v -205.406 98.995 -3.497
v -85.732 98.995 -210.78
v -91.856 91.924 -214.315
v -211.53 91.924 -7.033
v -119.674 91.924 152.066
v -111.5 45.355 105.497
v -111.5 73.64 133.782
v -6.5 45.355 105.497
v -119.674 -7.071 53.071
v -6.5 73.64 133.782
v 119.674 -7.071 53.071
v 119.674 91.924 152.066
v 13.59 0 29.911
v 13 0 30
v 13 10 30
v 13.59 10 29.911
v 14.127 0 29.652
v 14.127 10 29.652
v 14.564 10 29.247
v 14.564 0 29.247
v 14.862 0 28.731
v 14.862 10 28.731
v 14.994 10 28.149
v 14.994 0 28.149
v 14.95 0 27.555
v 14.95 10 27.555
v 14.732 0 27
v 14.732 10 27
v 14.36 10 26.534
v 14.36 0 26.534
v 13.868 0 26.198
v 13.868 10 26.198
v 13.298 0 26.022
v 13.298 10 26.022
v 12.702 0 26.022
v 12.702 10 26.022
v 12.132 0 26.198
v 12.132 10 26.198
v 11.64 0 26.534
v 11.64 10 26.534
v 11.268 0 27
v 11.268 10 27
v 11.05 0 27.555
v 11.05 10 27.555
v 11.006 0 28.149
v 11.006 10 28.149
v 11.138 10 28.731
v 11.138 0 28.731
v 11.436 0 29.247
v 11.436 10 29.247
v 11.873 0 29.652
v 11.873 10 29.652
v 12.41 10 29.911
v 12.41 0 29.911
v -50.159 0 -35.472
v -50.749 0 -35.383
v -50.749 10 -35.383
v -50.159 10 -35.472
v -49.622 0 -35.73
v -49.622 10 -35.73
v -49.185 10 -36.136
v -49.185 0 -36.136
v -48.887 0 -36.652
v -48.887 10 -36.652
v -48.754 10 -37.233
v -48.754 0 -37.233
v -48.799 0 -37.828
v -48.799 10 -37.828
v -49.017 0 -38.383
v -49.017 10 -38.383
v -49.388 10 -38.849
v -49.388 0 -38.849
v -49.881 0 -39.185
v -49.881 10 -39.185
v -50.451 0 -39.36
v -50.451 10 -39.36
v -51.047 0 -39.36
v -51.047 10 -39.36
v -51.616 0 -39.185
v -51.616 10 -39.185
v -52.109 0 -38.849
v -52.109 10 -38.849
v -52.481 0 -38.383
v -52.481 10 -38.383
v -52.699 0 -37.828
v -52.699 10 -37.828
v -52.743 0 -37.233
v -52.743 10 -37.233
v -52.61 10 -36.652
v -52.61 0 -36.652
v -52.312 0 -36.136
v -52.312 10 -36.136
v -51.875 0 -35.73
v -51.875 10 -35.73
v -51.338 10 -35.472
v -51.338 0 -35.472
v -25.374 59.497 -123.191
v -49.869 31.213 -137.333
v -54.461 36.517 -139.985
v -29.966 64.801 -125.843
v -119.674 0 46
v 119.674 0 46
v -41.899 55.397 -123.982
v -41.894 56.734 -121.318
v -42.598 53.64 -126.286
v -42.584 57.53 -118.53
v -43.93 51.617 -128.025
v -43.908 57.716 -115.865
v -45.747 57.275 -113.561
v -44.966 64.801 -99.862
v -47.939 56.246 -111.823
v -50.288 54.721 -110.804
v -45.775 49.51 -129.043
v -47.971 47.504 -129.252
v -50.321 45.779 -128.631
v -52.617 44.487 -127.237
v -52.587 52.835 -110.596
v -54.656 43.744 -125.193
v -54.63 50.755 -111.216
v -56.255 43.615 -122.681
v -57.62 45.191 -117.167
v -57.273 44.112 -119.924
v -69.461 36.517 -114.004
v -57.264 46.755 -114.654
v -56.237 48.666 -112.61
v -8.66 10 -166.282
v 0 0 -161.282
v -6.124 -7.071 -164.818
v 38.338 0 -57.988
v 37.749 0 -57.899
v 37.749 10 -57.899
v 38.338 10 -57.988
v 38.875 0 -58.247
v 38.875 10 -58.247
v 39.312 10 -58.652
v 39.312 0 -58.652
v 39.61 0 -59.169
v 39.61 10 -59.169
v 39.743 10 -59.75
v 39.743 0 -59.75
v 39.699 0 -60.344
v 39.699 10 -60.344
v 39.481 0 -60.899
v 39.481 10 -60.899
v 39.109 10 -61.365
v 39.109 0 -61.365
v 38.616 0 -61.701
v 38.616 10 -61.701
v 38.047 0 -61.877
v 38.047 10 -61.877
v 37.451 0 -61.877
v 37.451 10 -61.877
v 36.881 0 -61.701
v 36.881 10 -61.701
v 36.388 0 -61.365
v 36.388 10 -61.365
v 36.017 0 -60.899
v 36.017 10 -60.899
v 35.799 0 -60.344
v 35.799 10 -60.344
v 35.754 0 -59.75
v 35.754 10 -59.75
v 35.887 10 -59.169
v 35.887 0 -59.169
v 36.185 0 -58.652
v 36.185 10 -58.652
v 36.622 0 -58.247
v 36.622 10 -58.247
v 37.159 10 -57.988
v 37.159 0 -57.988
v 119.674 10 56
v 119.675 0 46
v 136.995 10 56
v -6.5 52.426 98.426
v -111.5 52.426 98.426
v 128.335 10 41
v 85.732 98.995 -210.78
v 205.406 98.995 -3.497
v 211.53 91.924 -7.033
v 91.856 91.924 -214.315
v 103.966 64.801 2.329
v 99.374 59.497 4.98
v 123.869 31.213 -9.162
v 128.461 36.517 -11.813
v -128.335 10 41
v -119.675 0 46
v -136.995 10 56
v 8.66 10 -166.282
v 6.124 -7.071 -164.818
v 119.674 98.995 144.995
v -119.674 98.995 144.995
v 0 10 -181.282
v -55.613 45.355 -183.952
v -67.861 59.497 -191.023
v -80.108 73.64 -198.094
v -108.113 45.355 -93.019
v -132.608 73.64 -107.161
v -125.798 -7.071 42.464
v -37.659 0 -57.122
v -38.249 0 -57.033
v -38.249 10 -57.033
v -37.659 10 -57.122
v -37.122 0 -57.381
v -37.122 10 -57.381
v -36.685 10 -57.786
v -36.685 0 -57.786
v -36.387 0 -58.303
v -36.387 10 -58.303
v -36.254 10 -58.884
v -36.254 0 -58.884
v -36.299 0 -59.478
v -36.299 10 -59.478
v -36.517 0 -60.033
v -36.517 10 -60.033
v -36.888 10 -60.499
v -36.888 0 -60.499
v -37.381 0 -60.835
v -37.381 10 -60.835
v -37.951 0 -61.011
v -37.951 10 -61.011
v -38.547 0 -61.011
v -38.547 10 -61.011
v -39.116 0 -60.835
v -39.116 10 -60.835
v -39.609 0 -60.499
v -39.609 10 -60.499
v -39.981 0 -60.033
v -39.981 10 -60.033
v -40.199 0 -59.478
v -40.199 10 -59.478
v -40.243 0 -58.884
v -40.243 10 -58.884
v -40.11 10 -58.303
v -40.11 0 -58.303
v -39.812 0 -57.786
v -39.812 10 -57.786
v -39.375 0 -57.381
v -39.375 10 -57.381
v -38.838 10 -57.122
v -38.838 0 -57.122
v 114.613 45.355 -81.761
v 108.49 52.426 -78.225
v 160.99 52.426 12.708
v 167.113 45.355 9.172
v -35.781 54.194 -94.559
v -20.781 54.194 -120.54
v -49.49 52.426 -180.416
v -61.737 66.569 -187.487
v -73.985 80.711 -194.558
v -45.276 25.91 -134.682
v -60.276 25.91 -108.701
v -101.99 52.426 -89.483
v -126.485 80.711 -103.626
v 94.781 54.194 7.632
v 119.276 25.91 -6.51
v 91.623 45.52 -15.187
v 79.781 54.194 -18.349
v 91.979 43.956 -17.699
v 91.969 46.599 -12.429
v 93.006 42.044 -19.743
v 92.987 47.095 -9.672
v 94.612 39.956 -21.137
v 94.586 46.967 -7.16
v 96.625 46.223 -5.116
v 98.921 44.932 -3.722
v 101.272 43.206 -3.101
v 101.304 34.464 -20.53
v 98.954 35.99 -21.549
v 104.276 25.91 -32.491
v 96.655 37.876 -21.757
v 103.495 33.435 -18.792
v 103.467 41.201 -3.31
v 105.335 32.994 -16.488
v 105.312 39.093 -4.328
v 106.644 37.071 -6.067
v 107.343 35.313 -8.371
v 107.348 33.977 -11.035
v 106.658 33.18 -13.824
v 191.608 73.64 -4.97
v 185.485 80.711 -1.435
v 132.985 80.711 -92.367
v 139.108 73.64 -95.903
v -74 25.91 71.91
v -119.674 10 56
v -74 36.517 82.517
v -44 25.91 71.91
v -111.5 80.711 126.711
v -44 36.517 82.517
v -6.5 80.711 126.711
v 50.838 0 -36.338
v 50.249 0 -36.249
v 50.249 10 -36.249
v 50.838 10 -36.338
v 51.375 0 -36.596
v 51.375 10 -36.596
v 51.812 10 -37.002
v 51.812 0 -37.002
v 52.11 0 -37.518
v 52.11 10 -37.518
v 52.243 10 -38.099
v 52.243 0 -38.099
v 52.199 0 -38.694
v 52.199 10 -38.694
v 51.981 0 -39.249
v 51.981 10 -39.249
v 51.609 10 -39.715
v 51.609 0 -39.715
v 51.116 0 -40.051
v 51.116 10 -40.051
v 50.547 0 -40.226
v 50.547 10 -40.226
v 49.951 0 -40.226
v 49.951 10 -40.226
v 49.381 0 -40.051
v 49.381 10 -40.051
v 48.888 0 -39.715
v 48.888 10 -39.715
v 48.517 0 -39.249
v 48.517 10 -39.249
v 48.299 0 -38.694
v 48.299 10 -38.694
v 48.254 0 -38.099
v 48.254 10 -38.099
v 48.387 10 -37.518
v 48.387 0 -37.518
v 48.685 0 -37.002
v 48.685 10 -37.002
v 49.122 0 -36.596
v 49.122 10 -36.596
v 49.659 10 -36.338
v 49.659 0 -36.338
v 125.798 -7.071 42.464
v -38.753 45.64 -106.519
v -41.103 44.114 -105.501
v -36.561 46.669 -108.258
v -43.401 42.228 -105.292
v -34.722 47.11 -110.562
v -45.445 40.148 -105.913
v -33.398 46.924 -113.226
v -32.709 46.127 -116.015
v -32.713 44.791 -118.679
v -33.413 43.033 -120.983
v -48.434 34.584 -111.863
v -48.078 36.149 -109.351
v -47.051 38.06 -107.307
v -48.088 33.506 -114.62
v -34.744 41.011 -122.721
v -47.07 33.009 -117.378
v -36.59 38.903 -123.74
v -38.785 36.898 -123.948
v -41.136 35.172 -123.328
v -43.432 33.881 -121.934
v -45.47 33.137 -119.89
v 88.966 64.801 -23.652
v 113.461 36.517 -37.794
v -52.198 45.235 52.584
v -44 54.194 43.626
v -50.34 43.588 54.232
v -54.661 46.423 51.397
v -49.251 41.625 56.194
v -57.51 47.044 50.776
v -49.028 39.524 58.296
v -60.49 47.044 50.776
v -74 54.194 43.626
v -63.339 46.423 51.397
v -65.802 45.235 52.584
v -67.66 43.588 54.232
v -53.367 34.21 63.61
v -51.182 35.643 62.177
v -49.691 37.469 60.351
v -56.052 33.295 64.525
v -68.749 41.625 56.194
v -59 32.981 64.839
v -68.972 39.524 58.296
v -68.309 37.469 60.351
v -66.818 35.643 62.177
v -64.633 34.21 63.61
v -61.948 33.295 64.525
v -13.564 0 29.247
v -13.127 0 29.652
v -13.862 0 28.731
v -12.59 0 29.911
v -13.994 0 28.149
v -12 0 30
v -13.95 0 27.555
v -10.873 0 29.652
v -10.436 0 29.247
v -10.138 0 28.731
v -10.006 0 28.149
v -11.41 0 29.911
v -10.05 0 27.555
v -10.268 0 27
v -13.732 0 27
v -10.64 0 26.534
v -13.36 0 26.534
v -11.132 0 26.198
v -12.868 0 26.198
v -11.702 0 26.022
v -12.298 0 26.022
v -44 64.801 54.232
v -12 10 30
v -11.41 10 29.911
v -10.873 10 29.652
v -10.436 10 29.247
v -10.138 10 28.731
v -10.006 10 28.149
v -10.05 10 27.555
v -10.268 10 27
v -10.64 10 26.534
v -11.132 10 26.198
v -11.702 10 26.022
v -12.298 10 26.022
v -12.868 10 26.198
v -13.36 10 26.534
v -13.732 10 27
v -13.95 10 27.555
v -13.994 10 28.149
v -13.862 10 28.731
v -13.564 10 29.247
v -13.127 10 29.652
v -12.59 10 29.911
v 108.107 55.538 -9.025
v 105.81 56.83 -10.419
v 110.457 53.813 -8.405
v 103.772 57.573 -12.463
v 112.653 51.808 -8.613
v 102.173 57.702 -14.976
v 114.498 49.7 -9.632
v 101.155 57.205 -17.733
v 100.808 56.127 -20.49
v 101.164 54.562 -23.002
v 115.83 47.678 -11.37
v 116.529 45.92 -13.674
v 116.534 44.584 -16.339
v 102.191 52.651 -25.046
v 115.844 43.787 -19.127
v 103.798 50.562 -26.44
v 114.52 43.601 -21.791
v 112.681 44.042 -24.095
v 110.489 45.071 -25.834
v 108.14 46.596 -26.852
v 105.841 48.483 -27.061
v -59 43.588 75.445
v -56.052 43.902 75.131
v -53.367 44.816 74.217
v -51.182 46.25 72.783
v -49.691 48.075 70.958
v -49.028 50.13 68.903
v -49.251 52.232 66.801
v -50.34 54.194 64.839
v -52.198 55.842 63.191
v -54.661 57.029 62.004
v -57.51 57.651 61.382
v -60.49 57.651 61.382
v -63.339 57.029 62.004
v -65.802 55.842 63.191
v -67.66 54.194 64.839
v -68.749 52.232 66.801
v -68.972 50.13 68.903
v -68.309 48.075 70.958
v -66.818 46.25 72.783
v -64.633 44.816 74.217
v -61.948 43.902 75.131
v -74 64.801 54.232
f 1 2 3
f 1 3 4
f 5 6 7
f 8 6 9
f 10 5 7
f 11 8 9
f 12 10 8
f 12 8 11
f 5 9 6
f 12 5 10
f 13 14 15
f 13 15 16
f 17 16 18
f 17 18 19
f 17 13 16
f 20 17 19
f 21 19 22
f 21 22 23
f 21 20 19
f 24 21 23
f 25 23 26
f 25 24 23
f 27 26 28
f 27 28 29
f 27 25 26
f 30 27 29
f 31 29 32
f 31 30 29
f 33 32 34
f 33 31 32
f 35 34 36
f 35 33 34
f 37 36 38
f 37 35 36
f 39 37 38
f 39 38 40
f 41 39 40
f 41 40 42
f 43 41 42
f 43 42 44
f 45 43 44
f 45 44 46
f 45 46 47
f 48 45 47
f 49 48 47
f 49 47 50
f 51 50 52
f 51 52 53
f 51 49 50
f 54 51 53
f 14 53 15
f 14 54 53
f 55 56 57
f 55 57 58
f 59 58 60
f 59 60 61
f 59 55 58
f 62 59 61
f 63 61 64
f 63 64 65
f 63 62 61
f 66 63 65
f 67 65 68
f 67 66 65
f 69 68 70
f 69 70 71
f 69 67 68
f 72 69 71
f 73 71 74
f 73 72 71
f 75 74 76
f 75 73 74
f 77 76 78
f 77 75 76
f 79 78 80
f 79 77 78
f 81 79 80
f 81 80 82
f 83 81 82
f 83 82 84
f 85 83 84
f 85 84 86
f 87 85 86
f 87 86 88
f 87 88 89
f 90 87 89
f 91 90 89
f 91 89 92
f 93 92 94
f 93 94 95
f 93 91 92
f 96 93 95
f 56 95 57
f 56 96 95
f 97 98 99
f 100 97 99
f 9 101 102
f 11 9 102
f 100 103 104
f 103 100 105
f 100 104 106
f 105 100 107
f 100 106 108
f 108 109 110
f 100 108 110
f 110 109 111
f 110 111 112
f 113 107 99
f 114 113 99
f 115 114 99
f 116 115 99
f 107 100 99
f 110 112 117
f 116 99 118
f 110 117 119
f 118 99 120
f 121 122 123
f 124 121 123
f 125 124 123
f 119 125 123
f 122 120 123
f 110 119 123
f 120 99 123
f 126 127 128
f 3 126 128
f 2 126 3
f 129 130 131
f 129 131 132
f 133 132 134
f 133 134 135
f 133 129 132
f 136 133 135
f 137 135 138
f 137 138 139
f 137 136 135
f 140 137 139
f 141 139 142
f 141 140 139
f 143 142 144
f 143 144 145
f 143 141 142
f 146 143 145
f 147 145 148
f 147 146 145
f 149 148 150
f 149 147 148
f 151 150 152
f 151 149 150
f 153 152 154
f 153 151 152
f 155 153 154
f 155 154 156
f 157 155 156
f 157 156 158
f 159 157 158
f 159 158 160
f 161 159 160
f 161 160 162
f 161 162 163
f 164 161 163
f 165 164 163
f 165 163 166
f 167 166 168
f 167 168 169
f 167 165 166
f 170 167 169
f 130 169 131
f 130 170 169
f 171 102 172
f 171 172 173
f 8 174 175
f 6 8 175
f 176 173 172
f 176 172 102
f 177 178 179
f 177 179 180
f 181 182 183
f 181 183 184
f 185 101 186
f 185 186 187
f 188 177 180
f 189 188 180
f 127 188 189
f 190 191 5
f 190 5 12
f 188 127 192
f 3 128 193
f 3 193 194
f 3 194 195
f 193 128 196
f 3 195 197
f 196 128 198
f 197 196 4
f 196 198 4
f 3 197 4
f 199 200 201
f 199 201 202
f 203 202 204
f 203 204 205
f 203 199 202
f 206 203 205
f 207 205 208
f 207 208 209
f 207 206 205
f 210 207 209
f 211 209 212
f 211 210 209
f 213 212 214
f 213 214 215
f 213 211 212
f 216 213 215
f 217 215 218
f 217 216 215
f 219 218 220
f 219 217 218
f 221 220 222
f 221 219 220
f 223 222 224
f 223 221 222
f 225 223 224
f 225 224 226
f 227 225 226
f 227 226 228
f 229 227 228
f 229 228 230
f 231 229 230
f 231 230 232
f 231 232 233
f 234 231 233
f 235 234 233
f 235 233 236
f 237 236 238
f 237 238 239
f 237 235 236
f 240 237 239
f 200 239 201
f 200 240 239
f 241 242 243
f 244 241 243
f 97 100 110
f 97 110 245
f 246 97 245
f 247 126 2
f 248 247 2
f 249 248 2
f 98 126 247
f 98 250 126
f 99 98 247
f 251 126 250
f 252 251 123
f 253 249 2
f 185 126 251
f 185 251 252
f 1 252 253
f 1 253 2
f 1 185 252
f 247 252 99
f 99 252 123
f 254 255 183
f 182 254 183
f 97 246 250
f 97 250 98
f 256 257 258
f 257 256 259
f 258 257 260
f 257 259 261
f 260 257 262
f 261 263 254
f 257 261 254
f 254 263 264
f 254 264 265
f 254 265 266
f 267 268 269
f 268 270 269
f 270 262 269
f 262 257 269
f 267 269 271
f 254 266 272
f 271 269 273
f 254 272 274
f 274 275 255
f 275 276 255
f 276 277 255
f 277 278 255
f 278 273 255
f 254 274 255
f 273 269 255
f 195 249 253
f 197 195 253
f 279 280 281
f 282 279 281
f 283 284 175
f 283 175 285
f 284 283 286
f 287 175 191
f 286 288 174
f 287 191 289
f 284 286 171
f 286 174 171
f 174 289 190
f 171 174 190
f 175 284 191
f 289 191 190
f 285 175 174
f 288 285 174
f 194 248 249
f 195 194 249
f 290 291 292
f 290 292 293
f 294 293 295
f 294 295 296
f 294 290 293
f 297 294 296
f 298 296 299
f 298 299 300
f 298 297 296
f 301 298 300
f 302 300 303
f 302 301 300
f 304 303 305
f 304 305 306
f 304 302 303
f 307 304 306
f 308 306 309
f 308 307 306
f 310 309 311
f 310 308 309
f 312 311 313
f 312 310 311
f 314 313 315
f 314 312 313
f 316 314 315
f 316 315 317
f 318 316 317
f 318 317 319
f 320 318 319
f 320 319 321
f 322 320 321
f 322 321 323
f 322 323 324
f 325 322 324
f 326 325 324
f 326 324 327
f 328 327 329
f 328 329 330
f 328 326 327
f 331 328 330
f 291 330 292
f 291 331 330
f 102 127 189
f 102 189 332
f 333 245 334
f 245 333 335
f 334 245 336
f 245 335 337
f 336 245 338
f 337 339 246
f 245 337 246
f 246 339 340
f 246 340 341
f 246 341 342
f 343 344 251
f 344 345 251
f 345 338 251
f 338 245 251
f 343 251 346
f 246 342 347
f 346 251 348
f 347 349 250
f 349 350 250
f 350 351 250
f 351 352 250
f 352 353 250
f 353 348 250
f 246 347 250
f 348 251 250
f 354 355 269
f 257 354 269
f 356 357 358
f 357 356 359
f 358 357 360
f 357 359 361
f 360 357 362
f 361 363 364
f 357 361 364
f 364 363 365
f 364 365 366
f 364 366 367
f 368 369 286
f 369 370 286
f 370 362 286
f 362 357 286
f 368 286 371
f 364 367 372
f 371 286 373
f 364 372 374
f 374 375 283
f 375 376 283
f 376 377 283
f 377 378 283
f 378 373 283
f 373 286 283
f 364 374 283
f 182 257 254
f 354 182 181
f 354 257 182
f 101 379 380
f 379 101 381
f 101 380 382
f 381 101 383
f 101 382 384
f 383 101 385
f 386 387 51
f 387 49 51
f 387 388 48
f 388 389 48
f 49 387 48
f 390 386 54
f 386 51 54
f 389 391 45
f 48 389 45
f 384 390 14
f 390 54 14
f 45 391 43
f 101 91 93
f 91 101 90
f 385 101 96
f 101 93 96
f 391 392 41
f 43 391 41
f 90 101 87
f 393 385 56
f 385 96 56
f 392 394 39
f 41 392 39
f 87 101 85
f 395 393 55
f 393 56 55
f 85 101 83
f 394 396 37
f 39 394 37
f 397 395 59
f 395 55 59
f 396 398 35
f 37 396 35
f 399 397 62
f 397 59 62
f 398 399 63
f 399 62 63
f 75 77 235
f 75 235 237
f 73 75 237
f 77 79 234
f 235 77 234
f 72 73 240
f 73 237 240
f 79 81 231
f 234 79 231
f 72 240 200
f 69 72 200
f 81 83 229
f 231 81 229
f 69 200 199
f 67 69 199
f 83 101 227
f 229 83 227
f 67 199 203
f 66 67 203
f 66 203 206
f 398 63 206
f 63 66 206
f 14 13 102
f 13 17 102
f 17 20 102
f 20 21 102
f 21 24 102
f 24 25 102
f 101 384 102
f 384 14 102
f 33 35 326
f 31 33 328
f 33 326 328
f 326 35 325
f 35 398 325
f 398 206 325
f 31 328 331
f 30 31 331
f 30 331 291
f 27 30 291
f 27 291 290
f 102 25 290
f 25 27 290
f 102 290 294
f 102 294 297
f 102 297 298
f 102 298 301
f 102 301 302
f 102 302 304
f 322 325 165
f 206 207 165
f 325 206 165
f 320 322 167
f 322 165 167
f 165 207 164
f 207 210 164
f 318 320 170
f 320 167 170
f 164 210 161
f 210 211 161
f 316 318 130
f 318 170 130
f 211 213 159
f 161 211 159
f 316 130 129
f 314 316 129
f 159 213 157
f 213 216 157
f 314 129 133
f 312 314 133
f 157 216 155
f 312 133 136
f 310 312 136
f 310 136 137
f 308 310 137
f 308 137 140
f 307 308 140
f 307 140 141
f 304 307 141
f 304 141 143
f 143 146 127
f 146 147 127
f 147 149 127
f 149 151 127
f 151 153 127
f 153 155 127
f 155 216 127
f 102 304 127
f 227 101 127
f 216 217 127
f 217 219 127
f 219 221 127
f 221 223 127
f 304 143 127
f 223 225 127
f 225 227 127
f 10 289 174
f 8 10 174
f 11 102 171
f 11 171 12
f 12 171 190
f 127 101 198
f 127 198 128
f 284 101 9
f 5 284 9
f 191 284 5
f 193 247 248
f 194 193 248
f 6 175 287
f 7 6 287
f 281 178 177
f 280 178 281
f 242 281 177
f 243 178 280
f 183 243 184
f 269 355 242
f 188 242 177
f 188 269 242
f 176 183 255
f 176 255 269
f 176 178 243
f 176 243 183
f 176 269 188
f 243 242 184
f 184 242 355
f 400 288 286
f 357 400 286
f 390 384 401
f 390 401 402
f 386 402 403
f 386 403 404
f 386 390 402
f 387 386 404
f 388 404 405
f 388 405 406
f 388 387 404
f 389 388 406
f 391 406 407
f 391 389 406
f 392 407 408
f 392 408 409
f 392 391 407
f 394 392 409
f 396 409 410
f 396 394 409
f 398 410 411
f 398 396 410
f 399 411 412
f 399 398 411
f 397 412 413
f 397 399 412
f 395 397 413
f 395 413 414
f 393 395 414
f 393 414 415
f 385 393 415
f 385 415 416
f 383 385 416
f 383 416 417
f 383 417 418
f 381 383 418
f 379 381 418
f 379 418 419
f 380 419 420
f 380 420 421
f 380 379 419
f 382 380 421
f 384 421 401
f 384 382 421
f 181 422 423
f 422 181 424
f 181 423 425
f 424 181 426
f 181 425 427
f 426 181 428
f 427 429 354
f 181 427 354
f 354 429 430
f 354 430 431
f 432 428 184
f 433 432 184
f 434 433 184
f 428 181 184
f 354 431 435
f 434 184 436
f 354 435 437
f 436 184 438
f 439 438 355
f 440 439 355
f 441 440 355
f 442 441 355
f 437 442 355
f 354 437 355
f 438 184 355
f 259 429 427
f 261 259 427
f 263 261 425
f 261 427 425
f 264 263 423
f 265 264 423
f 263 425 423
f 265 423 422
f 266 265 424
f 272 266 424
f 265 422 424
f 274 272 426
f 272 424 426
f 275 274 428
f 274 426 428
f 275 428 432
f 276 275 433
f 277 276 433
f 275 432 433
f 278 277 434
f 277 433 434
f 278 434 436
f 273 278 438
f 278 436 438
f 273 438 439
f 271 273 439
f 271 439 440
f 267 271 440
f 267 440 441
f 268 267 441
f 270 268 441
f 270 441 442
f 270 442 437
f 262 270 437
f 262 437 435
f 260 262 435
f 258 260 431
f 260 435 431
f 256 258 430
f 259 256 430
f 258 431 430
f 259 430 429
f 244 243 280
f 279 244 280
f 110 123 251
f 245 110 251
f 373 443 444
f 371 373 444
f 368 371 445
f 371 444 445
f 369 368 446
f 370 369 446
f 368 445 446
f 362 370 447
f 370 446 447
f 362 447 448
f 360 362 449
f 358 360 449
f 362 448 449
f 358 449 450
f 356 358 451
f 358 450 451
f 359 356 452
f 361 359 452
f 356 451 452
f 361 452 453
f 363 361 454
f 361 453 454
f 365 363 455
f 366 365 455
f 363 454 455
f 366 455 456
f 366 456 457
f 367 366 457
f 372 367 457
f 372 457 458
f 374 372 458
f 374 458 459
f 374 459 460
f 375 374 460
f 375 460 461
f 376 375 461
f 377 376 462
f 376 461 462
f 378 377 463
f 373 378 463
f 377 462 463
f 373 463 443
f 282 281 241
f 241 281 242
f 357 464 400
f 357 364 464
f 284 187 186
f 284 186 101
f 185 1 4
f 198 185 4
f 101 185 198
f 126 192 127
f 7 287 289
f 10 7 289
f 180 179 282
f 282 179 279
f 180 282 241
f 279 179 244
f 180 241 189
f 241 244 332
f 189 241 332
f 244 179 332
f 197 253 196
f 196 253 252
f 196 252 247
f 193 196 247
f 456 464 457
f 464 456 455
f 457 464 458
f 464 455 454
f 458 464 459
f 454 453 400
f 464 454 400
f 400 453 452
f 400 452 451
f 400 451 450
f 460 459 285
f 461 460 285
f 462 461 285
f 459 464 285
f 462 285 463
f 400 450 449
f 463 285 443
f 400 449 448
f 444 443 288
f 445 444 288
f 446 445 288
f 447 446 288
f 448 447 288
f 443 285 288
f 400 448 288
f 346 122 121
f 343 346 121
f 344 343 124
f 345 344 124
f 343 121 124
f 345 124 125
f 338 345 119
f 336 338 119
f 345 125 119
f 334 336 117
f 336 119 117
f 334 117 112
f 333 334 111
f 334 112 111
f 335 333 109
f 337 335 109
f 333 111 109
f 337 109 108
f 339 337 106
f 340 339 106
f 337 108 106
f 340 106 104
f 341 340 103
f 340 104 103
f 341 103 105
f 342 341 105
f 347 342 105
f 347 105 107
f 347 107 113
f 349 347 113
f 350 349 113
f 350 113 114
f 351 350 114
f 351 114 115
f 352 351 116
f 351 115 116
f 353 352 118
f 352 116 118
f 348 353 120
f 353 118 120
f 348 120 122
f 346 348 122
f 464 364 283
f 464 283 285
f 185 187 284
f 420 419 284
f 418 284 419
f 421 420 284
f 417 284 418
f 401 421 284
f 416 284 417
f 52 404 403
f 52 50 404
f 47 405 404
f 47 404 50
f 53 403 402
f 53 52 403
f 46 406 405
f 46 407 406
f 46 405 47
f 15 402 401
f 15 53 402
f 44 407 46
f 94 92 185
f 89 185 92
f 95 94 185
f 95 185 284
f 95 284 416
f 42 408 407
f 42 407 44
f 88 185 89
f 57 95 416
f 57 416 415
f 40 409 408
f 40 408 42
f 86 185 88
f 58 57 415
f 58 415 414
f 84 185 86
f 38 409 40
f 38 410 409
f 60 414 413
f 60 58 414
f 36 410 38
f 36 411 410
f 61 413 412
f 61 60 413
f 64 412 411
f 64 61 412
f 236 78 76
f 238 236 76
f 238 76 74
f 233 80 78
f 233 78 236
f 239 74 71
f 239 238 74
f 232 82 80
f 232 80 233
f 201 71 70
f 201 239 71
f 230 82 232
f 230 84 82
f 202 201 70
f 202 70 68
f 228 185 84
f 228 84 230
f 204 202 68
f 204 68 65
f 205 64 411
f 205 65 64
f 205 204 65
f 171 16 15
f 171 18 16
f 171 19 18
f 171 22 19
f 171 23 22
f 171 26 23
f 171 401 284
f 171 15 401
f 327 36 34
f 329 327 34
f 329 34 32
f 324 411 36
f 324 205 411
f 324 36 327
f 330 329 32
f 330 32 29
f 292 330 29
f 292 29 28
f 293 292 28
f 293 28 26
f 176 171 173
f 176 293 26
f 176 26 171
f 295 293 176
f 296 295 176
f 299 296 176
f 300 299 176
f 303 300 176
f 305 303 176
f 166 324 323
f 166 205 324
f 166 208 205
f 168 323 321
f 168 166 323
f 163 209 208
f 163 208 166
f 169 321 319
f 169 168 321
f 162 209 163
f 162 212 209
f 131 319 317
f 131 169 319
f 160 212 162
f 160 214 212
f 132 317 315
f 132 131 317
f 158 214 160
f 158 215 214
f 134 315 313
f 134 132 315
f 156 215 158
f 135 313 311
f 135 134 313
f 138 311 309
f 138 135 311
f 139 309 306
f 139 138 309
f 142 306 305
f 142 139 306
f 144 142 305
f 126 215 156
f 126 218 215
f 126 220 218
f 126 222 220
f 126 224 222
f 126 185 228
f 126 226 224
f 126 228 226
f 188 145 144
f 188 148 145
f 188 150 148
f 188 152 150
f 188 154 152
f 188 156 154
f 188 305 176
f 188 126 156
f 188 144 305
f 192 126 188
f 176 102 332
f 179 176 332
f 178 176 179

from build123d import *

# Parameters (mm, degrees)
SKETCH1_R           = 2
BOSS_EXTRUDE1_DEPTH = 10
CHAMFER2_SIZE       = 10
BOSS_EXTRUDE2_DEPTH = 10
BOSS_EXTRUDE3_DEPTH = 10
SKETCH6_W           = 239.348674296
SKETCH6_H           = 140
BOSS_EXTRUDE4_DEPTH = 10
CUT_EXTRUDE1_DEPTH  = 10
CUT_EXTRUDE2_DEPTH  = 10
CUT_EXTRUDE3_DEPTH  = 10
BOSS_EXTRUDE5_DEPTH = 40
SKETCH13_R          = 10
CUT_EXTRUDE4_DEPTH  = 15
BOSS_EXTRUDE6_DEPTH = 40
SKETCH15_R          = 10
CUT_EXTRUDE5_DEPTH  = 15
BOSS_EXTRUDE7_DEPTH = 40
SKETCH17_R          = 10
CUT_EXTRUDE6_DEPTH  = 15


with BuildPart() as part:
    # Sketch1 → Boss-Extrude1 (new body)
    with BuildSketch(Plane(origin=(0, 0, 0), x_dir=(1, 0, 0), z_dir=(0, 1, 0))):
        Polygon((0, 181.282032303), (-136.994845224, -56), (136.994845224, -56), align=None)
        with Locations(Location((-38.248711306, 59.033320997, 0), (0, 0, 270))):
            Circle(SKETCH1_R, mode=Mode.SUBTRACT)
        with Locations(Location((-50.748711306, 37.382685902, 0), (0, 0, 270))):
            Circle(SKETCH1_R, mode=Mode.SUBTRACT)
        with Locations(Location((37.748711306, 59.899346401, 0), (0, 0, 270))):
            Circle(SKETCH1_R, mode=Mode.SUBTRACT)
        with Locations(Location((50.248711306, 38.248711306, 0), (0, 0, 270))):
            Circle(SKETCH1_R, mode=Mode.SUBTRACT)
        with Locations(Location((-12, -28, 0), (0, 0, 270))):
            Circle(SKETCH1_R, mode=Mode.SUBTRACT)
        with Locations(Location((13, -28, 0), (0, 0, 270))):
            Circle(SKETCH1_R, mode=Mode.SUBTRACT)
    extrude(amount=BOSS_EXTRUDE1_DEPTH)

    # Chamfer2
    chamfer2_edges = [part.edges().sort_by_distance(p)[0] for p in [
        (68.497422612, 0, -62.641016151),
        (-68.497422612, 0, -62.641016151),
        (0, 0, 56),
    ]]
    chamfer(chamfer2_edges, length=CHAMFER2_SIZE - 0.0001)  # a hair under: the kernel refuses the full size

    # Sketch4 → Boss-Extrude2 (add)
    with BuildSketch(Plane(origin=(34.918584287, -40.320508076, -20.160254038), x_dir=(0.7905694150420945, 0.547722557505166, 0.2738612787525844), z_dir=(0.6123724356957949, -0.7071067811865465, -0.3535533905932751))):
        Polygon((107.208489537, 41.143650786), (215.652023231, -47.400123699), (64.274630088, -232.798809596), (-44.168903606, -144.255035111), align=None)
    extrude(amount=BOSS_EXTRUDE2_DEPTH)

    # Sketch5 → Boss-Extrude3 (add)
    with BuildSketch(Plane(origin=(-34.918584287, -40.320508076, -20.160254038), x_dir=(0.7905694150420941, -0.5477225575051675, -0.27386127875258237), z_dir=(-0.6123724356957955, -0.7071067811865476, -0.35355339059327195))):
        Polygon((44.168903606, -144.255035111), (-64.274630088, -232.798809596), (-215.652023231, -47.400123699), (-107.208489537, 41.143650786), align=None)
    extrude(amount=BOSS_EXTRUDE3_DEPTH)

    # Sketch6 → Boss-Extrude4 (add)
    with BuildSketch(Plane(origin=(0, -23, 23), x_dir=(1, 0, 0), z_dir=(0, -0.7071067811865468, 0.7071067811865483))):
        with Locations((0, 102.526911935)):
            Rectangle(SKETCH6_W, SKETCH6_H)
    extrude(amount=BOSS_EXTRUDE4_DEPTH)

    # Sketch8 → Cut-Extrude1 (cut)
    with BuildSketch(Plane(origin=(-34.918584287, -40.320508076, -20.160254038), x_dir=(0.7905694150420941, -0.5477225575051675, -0.2738612787525823), z_dir=(0.6123724356957955, 0.7071067811865477, 0.35355339059327195))):
        Polygon((-33.923185833, 197.463935256), (-49.415119218, 210.113045896), (-115.822950082, 128.780395626), (-84.839083312, 103.482174345), (-18.431252448, 184.814824615), align=None)
    extrude(amount=-CUT_EXTRUDE1_DEPTH, mode=Mode.SUBTRACT)

    # Sketch10 → Cut-Extrude2 (cut)
    with BuildSketch(Plane(origin=(34.918584287, -40.320508076, -20.160254038), x_dir=(0.7905694150420944, 0.5477225575051661, 0.2738612787525847), z_dir=(-0.6123724356957952, 0.7071067811865464, 0.3535533905932753))):
        Polygon((174.960769477, 24.728878015), (190.452702862, 37.377988656), (124.044871998, 118.710638926), (93.061005228, 93.412417645), (159.468836092, 12.079767374), align=None)
    extrude(amount=-CUT_EXTRUDE2_DEPTH, mode=Mode.SUBTRACT)

    # Sketch11 → Cut-Extrude3 (cut)
    with BuildSketch(Plane(origin=(0, -23, 23), x_dir=(1, 0, 0), z_dir=(0, 0.7071067811865468, -0.7071067811865483))):
        Polygon((-111.5, -126.669047558), (-111.5, -146.669047558), (-6.5, -146.669047558), (-6.5, -106.669047558), (-111.5, -106.669047558), align=None)
    extrude(amount=-CUT_EXTRUDE3_DEPTH, mode=Mode.SUBTRACT)

    # Sketch12 → Boss-Extrude5 (add)
    with BuildSketch(Plane(origin=(-34.918584287, -40.320508076, -20.160254038), x_dir=(0.7905694150420941, -0.5477225575051675, -0.2738612787525823), z_dir=(0.6123724356957955, 0.7071067811865477, 0.35355339059327195))):
        Polygon((-18.910434822, 136.793783558), (-24.719909842, 141.537200048), (-43.693575803, 118.299299971), (-32.074625764, 108.81246699), (-13.100959803, 132.050367067), align=None)
    extrude(amount=BOSS_EXTRUDE5_DEPTH)

    # Sketch13 → Cut-Extrude4 (cut)
    with BuildSketch(Plane(origin=(-66.542804663, 76.83701237, -38.418506185), x_dir=(0.7905694150420933, 0.5477225575051691, -0.27386127875258187), z_dir=(-0.6123724356957966, 0.7071067811865475, -0.35355339059327057))):
        with Locations(Location((21.287016809, 84.607785007, 0), (0, 0, 162.976133815))):
            Circle(SKETCH13_R)
    extrude(amount=-CUT_EXTRUDE4_DEPTH, mode=Mode.SUBTRACT)

    # Sketch14 → Boss-Extrude6 (add)
    with BuildSketch(Plane(origin=(34.918584287, -40.320508076, -20.160254038), x_dir=(0.7905694150420944, 0.5477225575051661, 0.2738612787525847), z_dir=(-0.6123724356957952, 0.7071067811865464, 0.3535533905932753))):
        Polygon((112.513853563, 22.15347651), (118.323328583, 26.896893), (99.349662622, 50.134793077), (87.730712583, 40.647960097), (106.704378544, 17.41006002), align=None)
    extrude(amount=BOSS_EXTRUDE6_DEPTH)

    # Sketch15 → Cut-Extrude5 (cut)
    with BuildSketch(Plane(origin=(66.542804663, 76.83701237, -38.418506185), x_dir=(0.7905694150420963, -0.5477225575051645, 0.2738612787525824), z_dir=(0.6123724356957928, 0.7071067811865488, -0.3535533905932746))):
        with Locations(Location((53.342735971, -6.794621963, 0), (0, 0, 197.023866185))):
            Circle(SKETCH15_R)
    extrude(amount=-CUT_EXTRUDE5_DEPTH, mode=Mode.SUBTRACT)

    # Sketch16 → Boss-Extrude7 (add)
    with BuildSketch(Plane(origin=(0, -23, 23), x_dir=(1, 0, 0), z_dir=(0, 0.7071067811865468, -0.7071067811865483))):
        Polygon((-74, -76.669047558), (-74, -84.169047558), (-44, -84.169047558), (-44, -69.169047558), (-74, -69.169047558), align=None)
    extrude(amount=BOSS_EXTRUDE7_DEPTH)

    # Sketch17 → Cut-Extrude6 (cut)
    with BuildSketch(Plane(origin=(0, 59.516504294, 59.516504294), x_dir=(1, 0, 0), z_dir=(0, 0.7071067811865482, 0.7071067811865468))):
        with Locations(Location((-59, -12.526911935, 0), (0, 0, 270))):
            Circle(SKETCH17_R)
    extrude(amount=-CUT_EXTRUDE6_DEPTH, mode=Mode.SUBTRACT)


solid = part.part
